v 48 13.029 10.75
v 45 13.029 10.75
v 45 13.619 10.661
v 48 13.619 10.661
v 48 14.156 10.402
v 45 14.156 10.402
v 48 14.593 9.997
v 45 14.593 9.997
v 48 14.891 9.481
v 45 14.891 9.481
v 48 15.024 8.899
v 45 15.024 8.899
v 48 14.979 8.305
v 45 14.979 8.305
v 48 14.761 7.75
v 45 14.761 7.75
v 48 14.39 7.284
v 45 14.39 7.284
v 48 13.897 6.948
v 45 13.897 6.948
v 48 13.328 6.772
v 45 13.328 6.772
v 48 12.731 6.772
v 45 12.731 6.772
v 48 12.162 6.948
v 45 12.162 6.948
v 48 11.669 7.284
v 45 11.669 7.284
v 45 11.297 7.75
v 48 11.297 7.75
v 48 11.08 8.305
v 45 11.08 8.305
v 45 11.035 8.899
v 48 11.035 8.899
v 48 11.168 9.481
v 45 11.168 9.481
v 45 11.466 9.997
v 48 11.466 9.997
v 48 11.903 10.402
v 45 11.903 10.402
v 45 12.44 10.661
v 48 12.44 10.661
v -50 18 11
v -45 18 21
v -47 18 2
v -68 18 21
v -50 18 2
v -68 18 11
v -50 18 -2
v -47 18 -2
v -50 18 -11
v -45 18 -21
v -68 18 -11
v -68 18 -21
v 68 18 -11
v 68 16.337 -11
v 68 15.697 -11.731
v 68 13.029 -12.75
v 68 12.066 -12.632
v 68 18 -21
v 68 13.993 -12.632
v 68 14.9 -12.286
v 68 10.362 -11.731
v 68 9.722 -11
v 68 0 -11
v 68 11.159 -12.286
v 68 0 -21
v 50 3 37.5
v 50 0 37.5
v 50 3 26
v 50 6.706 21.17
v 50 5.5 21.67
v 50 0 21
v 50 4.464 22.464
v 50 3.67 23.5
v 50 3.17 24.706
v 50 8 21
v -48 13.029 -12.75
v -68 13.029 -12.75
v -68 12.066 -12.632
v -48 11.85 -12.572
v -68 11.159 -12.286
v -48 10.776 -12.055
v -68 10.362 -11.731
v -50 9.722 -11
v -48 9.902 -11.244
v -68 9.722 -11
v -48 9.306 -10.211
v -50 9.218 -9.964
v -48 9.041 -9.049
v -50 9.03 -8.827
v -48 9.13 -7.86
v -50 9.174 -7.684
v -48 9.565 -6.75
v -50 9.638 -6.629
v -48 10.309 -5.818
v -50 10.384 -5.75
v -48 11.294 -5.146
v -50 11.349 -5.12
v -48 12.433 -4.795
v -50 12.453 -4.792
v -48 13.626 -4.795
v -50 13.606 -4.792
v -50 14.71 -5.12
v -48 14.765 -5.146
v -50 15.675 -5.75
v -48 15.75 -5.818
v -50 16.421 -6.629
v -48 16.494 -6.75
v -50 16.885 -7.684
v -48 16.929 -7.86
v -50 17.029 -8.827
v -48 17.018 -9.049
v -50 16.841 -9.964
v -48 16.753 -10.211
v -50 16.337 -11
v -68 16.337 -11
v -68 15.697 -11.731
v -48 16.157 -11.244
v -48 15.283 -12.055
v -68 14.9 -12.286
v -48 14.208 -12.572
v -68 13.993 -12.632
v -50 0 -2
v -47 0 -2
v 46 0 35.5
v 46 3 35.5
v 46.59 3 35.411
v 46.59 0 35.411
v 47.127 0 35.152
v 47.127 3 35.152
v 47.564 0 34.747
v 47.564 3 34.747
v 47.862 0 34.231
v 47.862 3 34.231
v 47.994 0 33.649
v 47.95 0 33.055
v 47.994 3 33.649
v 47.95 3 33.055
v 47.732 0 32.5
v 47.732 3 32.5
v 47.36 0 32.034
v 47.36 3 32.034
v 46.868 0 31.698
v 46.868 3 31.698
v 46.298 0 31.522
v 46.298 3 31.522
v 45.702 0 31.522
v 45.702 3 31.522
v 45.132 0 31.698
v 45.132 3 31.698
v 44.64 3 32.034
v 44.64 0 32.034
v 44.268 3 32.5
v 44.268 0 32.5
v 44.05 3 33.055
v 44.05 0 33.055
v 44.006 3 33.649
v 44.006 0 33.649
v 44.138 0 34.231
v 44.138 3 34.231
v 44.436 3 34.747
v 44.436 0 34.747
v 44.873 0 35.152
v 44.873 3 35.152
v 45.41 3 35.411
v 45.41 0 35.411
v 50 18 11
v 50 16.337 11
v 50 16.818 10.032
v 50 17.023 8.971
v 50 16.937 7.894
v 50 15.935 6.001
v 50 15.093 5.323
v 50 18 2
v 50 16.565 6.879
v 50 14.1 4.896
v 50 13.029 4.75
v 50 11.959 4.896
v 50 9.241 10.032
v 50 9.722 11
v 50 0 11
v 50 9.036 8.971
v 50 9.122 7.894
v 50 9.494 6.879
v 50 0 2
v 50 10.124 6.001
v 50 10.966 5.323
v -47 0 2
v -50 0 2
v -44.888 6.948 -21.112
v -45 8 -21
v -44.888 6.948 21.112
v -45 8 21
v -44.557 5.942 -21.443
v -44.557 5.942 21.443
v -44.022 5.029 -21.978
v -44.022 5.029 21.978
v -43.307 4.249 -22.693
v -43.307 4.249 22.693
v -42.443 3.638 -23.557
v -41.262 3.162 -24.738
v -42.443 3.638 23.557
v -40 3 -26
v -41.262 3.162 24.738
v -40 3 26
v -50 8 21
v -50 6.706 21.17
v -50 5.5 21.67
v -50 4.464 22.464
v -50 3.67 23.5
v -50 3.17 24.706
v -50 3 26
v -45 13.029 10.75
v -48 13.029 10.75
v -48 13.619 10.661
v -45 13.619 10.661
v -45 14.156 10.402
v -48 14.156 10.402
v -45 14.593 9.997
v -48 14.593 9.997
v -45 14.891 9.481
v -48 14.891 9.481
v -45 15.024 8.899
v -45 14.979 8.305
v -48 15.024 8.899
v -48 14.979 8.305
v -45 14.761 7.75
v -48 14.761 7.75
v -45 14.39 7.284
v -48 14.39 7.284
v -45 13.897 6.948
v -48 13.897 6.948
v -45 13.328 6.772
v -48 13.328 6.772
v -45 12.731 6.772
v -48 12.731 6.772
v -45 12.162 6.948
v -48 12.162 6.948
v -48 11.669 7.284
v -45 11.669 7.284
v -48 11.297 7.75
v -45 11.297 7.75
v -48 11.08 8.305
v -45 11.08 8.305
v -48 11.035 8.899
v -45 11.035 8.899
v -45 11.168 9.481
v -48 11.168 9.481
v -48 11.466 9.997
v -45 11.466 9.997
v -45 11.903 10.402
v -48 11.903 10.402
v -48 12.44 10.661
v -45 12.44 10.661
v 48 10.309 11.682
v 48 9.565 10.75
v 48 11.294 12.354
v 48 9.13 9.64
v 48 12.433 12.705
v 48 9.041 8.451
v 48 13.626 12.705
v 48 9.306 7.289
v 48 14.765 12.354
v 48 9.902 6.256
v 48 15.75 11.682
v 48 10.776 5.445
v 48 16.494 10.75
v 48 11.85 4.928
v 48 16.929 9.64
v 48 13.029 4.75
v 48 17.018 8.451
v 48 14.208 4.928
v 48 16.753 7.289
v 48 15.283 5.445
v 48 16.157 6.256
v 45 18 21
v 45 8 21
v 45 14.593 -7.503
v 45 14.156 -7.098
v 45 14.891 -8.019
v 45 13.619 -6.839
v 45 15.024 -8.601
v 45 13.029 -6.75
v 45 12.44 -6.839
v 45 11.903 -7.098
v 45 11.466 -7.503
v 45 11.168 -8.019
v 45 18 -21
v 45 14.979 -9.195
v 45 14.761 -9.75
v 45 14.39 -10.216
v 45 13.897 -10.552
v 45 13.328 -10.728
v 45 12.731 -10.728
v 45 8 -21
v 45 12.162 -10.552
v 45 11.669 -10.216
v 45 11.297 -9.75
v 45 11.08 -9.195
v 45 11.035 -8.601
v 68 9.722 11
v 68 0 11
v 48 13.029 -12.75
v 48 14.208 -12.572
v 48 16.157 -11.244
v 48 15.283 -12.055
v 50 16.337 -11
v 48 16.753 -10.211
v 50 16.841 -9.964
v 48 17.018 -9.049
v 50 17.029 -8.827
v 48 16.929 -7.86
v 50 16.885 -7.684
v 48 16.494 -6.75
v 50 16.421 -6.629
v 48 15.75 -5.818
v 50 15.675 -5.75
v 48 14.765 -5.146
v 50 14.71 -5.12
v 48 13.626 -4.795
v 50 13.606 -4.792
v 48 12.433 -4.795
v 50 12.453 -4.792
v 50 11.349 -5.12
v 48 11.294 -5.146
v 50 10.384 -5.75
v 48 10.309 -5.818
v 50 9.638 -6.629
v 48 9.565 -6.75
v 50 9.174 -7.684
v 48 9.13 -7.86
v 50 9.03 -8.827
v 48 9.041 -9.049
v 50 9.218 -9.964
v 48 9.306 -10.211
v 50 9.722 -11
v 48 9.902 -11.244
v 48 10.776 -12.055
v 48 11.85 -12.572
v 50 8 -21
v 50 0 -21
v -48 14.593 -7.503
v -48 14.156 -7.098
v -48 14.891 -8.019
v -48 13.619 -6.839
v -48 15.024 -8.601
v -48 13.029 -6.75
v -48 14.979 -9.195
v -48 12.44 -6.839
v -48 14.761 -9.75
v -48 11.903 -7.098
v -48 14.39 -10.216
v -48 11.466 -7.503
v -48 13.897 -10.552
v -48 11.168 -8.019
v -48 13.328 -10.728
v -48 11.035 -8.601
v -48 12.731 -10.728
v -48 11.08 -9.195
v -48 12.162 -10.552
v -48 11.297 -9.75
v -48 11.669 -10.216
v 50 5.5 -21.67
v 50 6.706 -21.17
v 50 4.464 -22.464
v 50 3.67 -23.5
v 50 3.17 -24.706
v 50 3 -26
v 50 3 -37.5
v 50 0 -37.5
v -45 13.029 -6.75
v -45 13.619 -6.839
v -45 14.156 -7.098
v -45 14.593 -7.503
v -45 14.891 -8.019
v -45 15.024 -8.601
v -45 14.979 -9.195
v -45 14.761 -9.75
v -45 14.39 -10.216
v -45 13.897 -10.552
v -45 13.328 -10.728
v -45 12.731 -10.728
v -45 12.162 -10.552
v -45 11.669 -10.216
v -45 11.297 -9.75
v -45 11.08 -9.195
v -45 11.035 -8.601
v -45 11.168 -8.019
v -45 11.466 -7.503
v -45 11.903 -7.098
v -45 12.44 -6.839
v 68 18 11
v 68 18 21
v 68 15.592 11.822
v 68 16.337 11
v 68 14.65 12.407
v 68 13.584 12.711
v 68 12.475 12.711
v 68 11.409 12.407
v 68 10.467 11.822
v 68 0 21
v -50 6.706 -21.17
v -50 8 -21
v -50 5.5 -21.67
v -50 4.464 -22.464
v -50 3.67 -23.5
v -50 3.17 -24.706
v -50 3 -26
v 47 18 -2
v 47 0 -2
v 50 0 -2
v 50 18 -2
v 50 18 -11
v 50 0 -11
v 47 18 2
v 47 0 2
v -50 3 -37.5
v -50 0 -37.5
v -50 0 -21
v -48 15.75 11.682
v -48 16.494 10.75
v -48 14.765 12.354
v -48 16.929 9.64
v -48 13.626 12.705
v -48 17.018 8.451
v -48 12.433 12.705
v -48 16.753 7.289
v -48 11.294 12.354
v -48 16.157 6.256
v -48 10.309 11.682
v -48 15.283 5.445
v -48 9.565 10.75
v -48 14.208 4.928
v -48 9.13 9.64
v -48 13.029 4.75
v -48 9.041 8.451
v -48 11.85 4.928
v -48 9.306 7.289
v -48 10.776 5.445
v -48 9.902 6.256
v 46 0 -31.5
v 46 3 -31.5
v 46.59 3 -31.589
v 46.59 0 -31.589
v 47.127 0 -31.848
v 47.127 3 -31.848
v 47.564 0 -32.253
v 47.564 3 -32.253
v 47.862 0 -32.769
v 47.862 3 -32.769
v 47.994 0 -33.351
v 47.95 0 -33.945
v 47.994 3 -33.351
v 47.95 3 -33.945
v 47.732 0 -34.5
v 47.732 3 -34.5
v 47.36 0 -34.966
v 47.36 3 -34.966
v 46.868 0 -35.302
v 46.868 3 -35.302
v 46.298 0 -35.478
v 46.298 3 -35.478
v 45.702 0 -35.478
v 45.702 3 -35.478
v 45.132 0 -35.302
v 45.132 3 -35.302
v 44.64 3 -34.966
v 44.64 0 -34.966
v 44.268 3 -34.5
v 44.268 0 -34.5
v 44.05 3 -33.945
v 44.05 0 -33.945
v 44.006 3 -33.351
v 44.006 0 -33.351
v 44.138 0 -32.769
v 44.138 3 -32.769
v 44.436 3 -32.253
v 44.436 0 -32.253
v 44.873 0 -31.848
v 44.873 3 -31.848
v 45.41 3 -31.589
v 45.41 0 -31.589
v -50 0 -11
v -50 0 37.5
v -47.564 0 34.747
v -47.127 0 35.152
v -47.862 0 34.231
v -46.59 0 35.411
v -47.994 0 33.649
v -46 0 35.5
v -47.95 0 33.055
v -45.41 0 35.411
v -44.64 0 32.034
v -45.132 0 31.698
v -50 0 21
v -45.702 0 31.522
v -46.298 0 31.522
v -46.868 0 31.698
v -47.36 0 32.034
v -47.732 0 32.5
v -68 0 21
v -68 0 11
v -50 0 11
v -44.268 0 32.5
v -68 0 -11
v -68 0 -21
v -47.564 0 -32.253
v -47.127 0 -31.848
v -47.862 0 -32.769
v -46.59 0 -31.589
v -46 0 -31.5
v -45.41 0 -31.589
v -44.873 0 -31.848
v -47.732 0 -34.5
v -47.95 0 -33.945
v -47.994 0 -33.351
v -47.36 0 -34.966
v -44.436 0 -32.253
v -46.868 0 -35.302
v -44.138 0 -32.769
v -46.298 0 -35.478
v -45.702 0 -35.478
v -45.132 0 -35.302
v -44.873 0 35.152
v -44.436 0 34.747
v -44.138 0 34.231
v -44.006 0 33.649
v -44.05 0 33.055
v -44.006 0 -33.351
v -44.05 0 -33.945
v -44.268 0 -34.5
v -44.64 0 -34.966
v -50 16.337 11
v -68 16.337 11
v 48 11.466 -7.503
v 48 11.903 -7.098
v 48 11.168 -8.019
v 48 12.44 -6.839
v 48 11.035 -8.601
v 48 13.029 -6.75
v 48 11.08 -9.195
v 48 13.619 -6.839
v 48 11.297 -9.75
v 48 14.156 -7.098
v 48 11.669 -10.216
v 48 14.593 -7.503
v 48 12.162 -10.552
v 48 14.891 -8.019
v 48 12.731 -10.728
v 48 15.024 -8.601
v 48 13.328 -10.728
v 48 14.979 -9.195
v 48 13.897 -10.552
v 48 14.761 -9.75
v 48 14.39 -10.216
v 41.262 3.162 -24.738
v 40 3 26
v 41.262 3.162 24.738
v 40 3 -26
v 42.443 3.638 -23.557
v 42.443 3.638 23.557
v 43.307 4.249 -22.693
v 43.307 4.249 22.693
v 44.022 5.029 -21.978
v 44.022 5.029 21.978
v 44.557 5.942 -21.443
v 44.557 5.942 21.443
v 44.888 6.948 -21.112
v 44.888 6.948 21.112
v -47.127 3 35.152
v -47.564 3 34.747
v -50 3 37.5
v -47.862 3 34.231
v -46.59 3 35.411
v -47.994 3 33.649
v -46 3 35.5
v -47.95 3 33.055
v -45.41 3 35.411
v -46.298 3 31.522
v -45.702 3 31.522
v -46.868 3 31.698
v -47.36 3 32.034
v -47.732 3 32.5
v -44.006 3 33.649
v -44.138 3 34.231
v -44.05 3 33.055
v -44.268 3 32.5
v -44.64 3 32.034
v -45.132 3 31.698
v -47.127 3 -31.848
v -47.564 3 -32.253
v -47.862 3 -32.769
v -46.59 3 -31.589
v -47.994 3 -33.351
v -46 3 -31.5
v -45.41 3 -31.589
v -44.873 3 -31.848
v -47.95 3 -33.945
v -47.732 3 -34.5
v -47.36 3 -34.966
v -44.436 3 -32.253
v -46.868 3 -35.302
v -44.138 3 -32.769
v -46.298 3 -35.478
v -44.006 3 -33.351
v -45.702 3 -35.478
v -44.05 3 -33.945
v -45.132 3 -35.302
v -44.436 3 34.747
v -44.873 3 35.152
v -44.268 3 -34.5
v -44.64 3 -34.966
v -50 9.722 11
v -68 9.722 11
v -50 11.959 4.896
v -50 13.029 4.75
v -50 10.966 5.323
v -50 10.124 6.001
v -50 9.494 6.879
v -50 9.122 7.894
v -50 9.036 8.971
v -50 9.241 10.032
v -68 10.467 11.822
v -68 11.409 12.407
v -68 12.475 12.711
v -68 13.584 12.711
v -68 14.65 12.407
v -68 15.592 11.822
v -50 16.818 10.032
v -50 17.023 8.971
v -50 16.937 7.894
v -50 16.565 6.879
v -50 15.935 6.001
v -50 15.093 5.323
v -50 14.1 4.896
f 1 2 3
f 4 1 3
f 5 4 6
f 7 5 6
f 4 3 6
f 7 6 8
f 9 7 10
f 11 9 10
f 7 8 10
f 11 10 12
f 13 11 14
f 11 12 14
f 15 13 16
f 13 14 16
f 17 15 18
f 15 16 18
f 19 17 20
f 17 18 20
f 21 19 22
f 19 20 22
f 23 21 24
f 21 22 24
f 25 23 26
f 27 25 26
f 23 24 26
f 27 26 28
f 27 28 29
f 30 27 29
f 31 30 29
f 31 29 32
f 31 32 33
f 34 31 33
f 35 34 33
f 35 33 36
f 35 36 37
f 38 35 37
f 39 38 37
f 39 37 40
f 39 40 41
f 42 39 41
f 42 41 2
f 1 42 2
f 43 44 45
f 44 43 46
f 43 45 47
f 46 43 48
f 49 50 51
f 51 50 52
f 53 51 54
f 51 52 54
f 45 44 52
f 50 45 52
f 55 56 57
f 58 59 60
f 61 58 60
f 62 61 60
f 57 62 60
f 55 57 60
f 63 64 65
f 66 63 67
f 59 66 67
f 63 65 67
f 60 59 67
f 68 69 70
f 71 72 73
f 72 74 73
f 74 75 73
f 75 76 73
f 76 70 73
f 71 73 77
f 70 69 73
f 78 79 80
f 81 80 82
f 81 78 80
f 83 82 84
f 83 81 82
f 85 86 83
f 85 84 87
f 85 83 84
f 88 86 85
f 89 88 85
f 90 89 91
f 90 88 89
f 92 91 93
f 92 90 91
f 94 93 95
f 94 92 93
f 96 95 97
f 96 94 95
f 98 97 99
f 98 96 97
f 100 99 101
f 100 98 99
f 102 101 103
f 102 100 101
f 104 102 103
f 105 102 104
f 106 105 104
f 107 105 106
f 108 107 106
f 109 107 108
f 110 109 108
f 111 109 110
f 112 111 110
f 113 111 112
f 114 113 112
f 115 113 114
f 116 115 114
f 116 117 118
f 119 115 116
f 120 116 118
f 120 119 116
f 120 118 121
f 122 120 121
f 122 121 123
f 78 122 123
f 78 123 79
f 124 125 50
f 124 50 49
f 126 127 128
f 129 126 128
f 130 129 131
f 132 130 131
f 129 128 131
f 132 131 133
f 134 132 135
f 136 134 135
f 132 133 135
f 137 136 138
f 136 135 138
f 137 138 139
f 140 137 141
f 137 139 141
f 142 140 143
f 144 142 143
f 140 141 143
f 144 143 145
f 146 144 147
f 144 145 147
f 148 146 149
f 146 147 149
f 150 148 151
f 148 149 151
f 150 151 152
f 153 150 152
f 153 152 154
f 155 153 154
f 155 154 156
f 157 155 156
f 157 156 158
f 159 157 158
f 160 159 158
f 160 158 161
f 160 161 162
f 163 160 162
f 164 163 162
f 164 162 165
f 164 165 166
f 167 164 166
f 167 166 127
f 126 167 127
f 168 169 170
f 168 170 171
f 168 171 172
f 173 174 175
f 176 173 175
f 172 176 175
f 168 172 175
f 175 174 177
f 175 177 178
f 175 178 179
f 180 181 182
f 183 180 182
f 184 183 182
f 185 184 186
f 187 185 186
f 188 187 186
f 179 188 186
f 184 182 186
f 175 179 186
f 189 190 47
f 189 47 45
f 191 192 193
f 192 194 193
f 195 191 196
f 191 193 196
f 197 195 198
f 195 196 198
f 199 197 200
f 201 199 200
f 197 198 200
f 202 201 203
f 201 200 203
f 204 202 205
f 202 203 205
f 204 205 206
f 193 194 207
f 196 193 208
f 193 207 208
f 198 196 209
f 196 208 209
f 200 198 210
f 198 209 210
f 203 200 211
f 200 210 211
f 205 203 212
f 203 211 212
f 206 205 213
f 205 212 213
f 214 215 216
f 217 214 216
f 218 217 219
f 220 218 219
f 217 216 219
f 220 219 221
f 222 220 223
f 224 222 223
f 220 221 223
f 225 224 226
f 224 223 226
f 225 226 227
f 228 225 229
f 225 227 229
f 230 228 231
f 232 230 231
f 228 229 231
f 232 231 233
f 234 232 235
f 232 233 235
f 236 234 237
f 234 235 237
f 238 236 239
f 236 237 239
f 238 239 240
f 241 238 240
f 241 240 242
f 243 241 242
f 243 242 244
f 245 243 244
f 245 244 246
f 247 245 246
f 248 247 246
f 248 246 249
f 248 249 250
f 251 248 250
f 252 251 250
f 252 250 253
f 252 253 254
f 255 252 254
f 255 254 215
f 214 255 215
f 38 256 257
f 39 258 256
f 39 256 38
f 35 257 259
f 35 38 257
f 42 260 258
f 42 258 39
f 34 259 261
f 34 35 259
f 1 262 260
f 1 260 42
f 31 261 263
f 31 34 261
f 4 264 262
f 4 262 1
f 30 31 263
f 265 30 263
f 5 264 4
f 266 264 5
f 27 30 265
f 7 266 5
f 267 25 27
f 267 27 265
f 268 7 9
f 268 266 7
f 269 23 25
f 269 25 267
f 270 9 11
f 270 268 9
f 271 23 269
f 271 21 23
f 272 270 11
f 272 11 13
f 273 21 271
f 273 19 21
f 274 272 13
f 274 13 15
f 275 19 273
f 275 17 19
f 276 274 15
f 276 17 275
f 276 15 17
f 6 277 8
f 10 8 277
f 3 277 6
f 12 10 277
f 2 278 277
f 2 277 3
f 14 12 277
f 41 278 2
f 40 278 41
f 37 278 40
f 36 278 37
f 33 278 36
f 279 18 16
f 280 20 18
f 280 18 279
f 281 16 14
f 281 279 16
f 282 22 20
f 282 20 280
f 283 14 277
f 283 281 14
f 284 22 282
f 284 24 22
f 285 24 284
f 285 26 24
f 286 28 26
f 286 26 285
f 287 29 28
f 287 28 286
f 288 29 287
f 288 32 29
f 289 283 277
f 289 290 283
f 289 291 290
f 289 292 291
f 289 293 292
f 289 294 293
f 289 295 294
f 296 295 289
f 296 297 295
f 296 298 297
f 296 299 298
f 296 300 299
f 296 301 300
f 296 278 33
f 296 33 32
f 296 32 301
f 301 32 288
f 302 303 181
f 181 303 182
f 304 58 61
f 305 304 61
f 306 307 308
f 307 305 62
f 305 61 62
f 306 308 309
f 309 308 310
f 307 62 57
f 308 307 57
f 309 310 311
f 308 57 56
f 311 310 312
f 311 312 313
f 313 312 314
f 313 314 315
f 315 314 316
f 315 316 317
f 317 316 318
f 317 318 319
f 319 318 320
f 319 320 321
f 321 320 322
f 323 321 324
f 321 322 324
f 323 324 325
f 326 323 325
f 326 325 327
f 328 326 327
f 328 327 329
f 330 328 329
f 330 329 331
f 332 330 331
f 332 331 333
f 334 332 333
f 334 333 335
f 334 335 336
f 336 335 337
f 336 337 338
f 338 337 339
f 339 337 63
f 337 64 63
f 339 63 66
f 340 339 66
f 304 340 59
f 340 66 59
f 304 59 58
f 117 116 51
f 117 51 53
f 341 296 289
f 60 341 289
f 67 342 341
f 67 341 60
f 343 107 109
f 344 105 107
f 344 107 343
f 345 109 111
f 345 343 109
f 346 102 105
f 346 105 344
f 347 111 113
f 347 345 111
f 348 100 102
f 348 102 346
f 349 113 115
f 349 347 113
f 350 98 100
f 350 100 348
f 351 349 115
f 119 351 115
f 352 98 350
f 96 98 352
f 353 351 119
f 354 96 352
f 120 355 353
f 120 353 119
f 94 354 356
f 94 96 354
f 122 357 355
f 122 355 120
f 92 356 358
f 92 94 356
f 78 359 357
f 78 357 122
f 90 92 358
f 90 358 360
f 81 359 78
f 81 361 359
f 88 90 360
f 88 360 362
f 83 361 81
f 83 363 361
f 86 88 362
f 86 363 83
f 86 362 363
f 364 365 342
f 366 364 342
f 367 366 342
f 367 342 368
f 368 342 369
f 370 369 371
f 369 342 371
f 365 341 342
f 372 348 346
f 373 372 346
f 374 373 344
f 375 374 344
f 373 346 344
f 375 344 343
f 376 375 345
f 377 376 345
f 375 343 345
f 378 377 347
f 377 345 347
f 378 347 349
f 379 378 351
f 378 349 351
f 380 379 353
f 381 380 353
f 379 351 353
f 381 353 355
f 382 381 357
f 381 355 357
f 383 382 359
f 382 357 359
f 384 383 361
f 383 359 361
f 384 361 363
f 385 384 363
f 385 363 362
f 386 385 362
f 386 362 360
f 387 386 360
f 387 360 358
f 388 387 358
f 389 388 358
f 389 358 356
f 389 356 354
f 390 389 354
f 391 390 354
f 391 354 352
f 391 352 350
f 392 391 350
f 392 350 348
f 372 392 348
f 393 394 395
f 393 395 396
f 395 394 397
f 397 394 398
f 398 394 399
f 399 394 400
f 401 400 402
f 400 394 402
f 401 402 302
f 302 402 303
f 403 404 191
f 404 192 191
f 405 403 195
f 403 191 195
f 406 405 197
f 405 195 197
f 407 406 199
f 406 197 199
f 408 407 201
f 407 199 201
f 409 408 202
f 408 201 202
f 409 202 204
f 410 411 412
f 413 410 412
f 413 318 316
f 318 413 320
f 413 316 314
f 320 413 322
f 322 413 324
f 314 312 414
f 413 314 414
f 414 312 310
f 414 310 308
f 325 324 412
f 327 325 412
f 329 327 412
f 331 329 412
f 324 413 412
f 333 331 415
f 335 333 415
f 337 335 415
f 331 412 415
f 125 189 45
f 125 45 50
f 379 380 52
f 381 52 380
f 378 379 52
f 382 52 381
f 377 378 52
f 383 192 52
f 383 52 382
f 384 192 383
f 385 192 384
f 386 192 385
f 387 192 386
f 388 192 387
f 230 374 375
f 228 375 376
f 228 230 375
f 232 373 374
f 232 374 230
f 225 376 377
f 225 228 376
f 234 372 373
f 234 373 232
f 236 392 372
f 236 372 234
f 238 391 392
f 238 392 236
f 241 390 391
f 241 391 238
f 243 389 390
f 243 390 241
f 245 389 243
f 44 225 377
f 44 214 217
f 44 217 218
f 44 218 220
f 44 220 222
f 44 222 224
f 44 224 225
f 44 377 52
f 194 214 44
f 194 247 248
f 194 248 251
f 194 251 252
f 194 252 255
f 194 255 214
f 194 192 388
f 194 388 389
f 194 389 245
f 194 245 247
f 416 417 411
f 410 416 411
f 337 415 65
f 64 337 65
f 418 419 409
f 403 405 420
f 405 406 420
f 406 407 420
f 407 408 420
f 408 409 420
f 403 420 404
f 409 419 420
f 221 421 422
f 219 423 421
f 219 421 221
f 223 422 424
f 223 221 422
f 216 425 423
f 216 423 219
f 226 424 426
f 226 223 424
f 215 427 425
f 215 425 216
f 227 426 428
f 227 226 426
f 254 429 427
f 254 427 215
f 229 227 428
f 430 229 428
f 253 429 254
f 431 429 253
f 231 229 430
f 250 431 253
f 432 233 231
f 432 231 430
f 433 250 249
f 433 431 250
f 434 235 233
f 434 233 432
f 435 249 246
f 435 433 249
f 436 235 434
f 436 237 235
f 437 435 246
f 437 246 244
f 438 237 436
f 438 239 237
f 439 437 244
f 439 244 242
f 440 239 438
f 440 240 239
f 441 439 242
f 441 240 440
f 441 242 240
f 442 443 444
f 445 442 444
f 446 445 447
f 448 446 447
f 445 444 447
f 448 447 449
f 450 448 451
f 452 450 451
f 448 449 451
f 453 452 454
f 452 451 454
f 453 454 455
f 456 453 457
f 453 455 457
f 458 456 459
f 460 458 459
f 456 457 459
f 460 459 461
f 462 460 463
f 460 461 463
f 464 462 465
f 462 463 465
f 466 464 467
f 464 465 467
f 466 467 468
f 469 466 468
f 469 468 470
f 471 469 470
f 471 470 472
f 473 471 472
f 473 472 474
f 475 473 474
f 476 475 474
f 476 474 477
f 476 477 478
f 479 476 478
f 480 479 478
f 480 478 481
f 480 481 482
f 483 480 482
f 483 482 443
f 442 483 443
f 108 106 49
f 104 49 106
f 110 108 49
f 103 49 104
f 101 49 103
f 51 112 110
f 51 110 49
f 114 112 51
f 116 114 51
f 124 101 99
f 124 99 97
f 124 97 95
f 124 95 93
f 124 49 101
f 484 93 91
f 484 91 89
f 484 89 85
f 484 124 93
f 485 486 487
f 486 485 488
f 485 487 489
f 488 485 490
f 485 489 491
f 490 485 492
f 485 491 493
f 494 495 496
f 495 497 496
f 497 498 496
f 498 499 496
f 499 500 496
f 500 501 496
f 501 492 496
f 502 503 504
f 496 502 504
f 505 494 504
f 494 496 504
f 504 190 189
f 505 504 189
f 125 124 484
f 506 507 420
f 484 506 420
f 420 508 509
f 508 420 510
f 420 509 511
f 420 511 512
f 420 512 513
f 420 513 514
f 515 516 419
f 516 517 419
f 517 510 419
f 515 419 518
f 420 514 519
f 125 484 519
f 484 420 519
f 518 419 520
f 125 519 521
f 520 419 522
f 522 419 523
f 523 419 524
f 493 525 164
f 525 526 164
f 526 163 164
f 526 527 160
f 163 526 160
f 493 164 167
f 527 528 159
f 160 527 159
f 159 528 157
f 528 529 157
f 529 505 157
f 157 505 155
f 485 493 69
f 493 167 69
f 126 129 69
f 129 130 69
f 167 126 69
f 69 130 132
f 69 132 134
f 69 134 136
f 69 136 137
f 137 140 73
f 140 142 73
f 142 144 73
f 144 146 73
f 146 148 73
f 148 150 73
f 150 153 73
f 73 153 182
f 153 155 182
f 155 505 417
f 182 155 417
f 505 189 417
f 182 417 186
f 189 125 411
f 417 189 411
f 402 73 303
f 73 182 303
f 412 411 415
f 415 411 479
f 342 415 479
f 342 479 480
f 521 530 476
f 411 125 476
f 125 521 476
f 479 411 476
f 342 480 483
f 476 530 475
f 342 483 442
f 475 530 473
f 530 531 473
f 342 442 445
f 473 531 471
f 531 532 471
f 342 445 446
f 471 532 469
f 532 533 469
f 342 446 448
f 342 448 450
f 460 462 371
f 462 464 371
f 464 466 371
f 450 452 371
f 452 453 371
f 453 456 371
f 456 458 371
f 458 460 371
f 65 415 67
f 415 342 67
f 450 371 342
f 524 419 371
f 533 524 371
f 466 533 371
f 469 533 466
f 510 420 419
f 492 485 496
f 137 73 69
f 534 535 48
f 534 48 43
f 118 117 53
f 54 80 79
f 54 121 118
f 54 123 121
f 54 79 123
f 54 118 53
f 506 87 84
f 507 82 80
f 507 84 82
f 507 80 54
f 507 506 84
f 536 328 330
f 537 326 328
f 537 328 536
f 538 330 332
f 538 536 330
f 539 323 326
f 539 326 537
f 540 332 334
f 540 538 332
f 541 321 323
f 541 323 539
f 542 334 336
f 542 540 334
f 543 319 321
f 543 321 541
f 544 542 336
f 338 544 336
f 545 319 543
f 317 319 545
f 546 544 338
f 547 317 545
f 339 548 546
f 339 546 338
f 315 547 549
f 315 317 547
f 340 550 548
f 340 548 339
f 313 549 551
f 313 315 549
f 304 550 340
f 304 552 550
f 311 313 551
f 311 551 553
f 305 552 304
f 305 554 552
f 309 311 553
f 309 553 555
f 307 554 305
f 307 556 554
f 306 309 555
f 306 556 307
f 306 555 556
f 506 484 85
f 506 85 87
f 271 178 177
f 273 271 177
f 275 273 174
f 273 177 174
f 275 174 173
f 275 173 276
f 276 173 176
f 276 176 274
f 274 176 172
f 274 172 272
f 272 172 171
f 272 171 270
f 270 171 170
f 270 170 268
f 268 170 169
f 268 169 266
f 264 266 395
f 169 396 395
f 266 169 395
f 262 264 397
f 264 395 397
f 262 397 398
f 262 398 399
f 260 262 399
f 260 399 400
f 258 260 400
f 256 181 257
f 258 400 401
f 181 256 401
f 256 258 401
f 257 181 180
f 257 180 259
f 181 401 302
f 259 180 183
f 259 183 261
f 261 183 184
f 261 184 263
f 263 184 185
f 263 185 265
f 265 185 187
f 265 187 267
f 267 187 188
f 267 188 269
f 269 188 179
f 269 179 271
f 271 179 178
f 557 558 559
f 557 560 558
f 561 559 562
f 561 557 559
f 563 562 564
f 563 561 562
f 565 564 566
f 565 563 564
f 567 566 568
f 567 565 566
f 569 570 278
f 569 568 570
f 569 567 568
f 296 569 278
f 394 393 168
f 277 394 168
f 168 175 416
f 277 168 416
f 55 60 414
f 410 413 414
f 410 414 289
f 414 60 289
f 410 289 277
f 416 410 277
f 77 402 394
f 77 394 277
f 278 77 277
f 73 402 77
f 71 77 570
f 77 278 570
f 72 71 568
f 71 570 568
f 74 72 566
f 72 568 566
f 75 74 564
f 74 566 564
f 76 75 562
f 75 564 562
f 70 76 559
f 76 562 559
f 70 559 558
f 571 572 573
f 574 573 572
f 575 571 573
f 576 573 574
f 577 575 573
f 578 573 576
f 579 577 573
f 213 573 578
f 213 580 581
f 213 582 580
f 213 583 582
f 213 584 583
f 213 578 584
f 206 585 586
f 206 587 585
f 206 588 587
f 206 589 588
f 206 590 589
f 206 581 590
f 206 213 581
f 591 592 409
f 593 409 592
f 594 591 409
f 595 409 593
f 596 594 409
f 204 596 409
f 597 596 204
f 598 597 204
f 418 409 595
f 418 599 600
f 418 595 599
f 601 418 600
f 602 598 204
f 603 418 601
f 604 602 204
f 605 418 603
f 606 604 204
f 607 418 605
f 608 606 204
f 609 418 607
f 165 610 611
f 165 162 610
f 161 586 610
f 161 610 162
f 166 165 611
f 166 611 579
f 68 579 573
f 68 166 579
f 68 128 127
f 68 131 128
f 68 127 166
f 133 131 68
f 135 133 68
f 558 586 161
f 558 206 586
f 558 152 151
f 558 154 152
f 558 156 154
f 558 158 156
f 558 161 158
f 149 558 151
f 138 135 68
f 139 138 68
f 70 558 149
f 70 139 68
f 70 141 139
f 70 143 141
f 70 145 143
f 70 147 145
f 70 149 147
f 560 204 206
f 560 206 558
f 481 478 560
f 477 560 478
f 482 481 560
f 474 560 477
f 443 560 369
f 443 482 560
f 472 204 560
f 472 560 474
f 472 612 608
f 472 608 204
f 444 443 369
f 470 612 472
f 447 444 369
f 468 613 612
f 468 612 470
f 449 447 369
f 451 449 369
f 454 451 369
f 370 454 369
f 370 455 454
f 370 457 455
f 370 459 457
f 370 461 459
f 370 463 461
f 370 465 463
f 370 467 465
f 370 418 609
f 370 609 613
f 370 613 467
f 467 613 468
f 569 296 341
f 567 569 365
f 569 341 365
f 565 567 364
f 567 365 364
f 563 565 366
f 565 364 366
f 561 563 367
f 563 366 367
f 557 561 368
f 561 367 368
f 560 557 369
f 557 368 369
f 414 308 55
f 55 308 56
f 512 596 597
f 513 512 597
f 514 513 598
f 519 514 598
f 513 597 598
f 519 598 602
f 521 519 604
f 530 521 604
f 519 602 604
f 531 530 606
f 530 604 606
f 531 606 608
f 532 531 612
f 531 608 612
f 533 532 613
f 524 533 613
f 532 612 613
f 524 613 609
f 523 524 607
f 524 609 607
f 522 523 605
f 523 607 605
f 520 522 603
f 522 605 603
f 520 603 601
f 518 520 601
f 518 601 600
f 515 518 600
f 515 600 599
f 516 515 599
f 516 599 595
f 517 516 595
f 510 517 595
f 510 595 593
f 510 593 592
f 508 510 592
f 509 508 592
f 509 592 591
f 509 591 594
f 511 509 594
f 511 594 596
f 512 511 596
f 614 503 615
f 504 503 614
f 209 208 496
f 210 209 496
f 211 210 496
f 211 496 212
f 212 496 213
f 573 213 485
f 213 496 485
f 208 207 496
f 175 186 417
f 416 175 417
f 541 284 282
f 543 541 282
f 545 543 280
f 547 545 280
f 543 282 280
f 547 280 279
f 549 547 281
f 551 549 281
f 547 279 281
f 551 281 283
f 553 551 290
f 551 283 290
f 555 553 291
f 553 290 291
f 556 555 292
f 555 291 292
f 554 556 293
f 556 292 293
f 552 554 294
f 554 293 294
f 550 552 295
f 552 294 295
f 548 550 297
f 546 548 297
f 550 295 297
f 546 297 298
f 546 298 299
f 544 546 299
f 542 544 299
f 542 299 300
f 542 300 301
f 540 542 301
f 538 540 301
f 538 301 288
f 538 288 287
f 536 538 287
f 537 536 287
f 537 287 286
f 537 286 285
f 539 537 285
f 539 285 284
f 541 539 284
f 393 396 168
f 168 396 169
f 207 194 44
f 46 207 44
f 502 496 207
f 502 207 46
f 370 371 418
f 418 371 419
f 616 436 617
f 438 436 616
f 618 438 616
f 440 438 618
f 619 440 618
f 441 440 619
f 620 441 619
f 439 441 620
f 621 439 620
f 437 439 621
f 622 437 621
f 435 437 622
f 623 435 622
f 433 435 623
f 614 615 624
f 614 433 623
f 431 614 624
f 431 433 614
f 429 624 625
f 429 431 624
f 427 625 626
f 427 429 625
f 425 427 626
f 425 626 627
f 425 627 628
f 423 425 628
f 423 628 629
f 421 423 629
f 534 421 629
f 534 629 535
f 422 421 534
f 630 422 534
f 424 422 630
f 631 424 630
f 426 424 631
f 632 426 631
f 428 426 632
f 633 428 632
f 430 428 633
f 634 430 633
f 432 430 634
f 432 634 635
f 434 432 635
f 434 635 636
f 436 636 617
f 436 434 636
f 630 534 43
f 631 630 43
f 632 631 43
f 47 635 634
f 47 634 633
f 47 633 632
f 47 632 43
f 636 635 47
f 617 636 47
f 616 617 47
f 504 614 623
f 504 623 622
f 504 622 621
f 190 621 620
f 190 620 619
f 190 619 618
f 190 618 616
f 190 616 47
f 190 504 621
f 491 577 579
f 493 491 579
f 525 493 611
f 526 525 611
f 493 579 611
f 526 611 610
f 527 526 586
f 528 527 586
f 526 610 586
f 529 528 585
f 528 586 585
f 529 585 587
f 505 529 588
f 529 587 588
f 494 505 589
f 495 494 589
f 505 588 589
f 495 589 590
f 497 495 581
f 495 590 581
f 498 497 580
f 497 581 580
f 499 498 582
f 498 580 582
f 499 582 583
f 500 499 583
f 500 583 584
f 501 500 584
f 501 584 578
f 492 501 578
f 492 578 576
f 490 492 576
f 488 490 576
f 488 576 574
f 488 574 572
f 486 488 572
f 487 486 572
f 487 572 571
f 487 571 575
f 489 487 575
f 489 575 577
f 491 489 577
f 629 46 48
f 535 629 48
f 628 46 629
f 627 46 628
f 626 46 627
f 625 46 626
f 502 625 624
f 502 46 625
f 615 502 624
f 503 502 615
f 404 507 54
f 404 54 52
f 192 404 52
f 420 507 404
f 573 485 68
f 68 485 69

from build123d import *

# Parameters (mm, degrees)
BOSS_EXTRUDE1_DEPTH = 3
BOSS_EXTRUDE2_DEPTH = 15
SKETCH3_R           = 2
CUT_EXTRUDE1_DEPTH  = 126.116945295
SKETCH5_R           = 4
CUT_EXTRUDE3_DEPTH  = 20
CUT_EXTRUDE4_START  = -20
SKETCH6_R           = 4
CUT_EXTRUDE4_DEPTH  = 20
FILLET1_R           = 5
SKETCH7_R           = 2
CUT_EXTRUDE5_DEPTH  = 20


with BuildPart() as part:
    # Sketch1 → Boss-Extrude1 (new body)
    with BuildSketch(Plane(origin=(0, 0, 0), x_dir=(1, 0, 0), z_dir=(0, 1, 0))):
        Polygon((50, 2), (50, 11), (68, 11), (68, 21), (50, 21), (50, 37.5), (-50, 37.5), (-50, 21), (-68, 21), (-68, 11), (-50, 11), (-50, 2), (-47, 2), (-47, -2), (-50, -2), (-50, -11), (-68, -11), (-68, -21), (-50, -21), (-50, -37.5), (50, -37.5), (50, -21), (68, -21), (68, -11), (50, -11), (50, -2), (47, -2), (47, 2), align=None)
    extrude(amount=BOSS_EXTRUDE1_DEPTH)

    # Sketch2 → Boss-Extrude2 (add)
    with BuildSketch(Plane(origin=(0, 3, 0), x_dir=(1, 0, 0), z_dir=(0, 1, 0))):
        Polygon((-68, 11), (-68, 21), (-45, 21), (-45, -21), (-68, -21), (-68, -11), (-50, -11), (-50, -2), (-47, -2), (-47, 2), (-50, 2), (-50, 11), align=None)
        Polygon((45, -21), (45, 21), (68, 21), (68, 11), (50, 11), (50, 2), (47, 2), (47, -2), (50, -2), (50, -11), (68, -11), (68, -21), align=None)
    extrude(amount=BOSS_EXTRUDE2_DEPTH)

    # Sketch3 → Cut-Extrude1 (cut, through all)
    with BuildSketch(Plane.ZY.offset(50)):
        with Locations((-8.75, 13.029436278)):
            Circle(SKETCH3_R)
        with Locations((8.75, 13.029436278)):
            Circle(SKETCH3_R)
    extrude(amount=-CUT_EXTRUDE1_DEPTH, mode=Mode.SUBTRACT)

    # Sketch5 → Cut-Extrude3 (cut)
    with BuildSketch(Plane(origin=(68, 0, 0), x_dir=(0, 0, -1), z_dir=(1, 0, 0))):
        with Locations((-8.75, 13.029436278)):
            Circle(SKETCH5_R)
        with Locations((8.75, 13.029436278)):
            Circle(SKETCH5_R)
    extrude(amount=-CUT_EXTRUDE3_DEPTH, mode=Mode.SUBTRACT)

    # Sketch6 → Cut-Extrude4 (cut)
    with BuildSketch(Plane.ZY.offset(68).offset(CUT_EXTRUDE4_START)):
        with Locations(Location((8.75, 13.029436278, 0), (0, 0, 180))):
            Circle(SKETCH6_R)
        with Locations(Location((-8.75, 13.029436278, 0), (0, 0, 180))):
            Circle(SKETCH6_R)
    extrude(amount=CUT_EXTRUDE4_DEPTH, mode=Mode.SUBTRACT)

    # Fillet1
    fillet1_edges = [part.edges().sort_by_distance(p)[0] for p in [
        (47.5, 3, 21),
        (47.5, 3, -21),
        (45, 3, 0),
        (-47.5, 3, 21),
        (-45, 3, 0),
        (-47.5, 3, -21),
    ]]
    fillet(fillet1_edges, radius=FILLET1_R)

    # Sketch7 → Cut-Extrude5 (cut)
    with BuildSketch(Plane(origin=(0, 3, 0), x_dir=(1, 0, 0), z_dir=(0, 1, 0))):
        with Locations(Location((46, 33.5, 0), (0, 0, 270))):
            Circle(SKETCH7_R)
        with Locations(Location((-46, 33.5, 0), (0, 0, 270))):
            Circle(SKETCH7_R)
        with Locations(Location((46, -33.5, 0), (0, 0, 270))):
            Circle(SKETCH7_R)
        with Locations(Location((-46, -33.5, 0), (0, 0, 270))):
            Circle(SKETCH7_R)
    extrude(amount=-CUT_EXTRUDE5_DEPTH, mode=Mode.SUBTRACT)


solid = part.part
